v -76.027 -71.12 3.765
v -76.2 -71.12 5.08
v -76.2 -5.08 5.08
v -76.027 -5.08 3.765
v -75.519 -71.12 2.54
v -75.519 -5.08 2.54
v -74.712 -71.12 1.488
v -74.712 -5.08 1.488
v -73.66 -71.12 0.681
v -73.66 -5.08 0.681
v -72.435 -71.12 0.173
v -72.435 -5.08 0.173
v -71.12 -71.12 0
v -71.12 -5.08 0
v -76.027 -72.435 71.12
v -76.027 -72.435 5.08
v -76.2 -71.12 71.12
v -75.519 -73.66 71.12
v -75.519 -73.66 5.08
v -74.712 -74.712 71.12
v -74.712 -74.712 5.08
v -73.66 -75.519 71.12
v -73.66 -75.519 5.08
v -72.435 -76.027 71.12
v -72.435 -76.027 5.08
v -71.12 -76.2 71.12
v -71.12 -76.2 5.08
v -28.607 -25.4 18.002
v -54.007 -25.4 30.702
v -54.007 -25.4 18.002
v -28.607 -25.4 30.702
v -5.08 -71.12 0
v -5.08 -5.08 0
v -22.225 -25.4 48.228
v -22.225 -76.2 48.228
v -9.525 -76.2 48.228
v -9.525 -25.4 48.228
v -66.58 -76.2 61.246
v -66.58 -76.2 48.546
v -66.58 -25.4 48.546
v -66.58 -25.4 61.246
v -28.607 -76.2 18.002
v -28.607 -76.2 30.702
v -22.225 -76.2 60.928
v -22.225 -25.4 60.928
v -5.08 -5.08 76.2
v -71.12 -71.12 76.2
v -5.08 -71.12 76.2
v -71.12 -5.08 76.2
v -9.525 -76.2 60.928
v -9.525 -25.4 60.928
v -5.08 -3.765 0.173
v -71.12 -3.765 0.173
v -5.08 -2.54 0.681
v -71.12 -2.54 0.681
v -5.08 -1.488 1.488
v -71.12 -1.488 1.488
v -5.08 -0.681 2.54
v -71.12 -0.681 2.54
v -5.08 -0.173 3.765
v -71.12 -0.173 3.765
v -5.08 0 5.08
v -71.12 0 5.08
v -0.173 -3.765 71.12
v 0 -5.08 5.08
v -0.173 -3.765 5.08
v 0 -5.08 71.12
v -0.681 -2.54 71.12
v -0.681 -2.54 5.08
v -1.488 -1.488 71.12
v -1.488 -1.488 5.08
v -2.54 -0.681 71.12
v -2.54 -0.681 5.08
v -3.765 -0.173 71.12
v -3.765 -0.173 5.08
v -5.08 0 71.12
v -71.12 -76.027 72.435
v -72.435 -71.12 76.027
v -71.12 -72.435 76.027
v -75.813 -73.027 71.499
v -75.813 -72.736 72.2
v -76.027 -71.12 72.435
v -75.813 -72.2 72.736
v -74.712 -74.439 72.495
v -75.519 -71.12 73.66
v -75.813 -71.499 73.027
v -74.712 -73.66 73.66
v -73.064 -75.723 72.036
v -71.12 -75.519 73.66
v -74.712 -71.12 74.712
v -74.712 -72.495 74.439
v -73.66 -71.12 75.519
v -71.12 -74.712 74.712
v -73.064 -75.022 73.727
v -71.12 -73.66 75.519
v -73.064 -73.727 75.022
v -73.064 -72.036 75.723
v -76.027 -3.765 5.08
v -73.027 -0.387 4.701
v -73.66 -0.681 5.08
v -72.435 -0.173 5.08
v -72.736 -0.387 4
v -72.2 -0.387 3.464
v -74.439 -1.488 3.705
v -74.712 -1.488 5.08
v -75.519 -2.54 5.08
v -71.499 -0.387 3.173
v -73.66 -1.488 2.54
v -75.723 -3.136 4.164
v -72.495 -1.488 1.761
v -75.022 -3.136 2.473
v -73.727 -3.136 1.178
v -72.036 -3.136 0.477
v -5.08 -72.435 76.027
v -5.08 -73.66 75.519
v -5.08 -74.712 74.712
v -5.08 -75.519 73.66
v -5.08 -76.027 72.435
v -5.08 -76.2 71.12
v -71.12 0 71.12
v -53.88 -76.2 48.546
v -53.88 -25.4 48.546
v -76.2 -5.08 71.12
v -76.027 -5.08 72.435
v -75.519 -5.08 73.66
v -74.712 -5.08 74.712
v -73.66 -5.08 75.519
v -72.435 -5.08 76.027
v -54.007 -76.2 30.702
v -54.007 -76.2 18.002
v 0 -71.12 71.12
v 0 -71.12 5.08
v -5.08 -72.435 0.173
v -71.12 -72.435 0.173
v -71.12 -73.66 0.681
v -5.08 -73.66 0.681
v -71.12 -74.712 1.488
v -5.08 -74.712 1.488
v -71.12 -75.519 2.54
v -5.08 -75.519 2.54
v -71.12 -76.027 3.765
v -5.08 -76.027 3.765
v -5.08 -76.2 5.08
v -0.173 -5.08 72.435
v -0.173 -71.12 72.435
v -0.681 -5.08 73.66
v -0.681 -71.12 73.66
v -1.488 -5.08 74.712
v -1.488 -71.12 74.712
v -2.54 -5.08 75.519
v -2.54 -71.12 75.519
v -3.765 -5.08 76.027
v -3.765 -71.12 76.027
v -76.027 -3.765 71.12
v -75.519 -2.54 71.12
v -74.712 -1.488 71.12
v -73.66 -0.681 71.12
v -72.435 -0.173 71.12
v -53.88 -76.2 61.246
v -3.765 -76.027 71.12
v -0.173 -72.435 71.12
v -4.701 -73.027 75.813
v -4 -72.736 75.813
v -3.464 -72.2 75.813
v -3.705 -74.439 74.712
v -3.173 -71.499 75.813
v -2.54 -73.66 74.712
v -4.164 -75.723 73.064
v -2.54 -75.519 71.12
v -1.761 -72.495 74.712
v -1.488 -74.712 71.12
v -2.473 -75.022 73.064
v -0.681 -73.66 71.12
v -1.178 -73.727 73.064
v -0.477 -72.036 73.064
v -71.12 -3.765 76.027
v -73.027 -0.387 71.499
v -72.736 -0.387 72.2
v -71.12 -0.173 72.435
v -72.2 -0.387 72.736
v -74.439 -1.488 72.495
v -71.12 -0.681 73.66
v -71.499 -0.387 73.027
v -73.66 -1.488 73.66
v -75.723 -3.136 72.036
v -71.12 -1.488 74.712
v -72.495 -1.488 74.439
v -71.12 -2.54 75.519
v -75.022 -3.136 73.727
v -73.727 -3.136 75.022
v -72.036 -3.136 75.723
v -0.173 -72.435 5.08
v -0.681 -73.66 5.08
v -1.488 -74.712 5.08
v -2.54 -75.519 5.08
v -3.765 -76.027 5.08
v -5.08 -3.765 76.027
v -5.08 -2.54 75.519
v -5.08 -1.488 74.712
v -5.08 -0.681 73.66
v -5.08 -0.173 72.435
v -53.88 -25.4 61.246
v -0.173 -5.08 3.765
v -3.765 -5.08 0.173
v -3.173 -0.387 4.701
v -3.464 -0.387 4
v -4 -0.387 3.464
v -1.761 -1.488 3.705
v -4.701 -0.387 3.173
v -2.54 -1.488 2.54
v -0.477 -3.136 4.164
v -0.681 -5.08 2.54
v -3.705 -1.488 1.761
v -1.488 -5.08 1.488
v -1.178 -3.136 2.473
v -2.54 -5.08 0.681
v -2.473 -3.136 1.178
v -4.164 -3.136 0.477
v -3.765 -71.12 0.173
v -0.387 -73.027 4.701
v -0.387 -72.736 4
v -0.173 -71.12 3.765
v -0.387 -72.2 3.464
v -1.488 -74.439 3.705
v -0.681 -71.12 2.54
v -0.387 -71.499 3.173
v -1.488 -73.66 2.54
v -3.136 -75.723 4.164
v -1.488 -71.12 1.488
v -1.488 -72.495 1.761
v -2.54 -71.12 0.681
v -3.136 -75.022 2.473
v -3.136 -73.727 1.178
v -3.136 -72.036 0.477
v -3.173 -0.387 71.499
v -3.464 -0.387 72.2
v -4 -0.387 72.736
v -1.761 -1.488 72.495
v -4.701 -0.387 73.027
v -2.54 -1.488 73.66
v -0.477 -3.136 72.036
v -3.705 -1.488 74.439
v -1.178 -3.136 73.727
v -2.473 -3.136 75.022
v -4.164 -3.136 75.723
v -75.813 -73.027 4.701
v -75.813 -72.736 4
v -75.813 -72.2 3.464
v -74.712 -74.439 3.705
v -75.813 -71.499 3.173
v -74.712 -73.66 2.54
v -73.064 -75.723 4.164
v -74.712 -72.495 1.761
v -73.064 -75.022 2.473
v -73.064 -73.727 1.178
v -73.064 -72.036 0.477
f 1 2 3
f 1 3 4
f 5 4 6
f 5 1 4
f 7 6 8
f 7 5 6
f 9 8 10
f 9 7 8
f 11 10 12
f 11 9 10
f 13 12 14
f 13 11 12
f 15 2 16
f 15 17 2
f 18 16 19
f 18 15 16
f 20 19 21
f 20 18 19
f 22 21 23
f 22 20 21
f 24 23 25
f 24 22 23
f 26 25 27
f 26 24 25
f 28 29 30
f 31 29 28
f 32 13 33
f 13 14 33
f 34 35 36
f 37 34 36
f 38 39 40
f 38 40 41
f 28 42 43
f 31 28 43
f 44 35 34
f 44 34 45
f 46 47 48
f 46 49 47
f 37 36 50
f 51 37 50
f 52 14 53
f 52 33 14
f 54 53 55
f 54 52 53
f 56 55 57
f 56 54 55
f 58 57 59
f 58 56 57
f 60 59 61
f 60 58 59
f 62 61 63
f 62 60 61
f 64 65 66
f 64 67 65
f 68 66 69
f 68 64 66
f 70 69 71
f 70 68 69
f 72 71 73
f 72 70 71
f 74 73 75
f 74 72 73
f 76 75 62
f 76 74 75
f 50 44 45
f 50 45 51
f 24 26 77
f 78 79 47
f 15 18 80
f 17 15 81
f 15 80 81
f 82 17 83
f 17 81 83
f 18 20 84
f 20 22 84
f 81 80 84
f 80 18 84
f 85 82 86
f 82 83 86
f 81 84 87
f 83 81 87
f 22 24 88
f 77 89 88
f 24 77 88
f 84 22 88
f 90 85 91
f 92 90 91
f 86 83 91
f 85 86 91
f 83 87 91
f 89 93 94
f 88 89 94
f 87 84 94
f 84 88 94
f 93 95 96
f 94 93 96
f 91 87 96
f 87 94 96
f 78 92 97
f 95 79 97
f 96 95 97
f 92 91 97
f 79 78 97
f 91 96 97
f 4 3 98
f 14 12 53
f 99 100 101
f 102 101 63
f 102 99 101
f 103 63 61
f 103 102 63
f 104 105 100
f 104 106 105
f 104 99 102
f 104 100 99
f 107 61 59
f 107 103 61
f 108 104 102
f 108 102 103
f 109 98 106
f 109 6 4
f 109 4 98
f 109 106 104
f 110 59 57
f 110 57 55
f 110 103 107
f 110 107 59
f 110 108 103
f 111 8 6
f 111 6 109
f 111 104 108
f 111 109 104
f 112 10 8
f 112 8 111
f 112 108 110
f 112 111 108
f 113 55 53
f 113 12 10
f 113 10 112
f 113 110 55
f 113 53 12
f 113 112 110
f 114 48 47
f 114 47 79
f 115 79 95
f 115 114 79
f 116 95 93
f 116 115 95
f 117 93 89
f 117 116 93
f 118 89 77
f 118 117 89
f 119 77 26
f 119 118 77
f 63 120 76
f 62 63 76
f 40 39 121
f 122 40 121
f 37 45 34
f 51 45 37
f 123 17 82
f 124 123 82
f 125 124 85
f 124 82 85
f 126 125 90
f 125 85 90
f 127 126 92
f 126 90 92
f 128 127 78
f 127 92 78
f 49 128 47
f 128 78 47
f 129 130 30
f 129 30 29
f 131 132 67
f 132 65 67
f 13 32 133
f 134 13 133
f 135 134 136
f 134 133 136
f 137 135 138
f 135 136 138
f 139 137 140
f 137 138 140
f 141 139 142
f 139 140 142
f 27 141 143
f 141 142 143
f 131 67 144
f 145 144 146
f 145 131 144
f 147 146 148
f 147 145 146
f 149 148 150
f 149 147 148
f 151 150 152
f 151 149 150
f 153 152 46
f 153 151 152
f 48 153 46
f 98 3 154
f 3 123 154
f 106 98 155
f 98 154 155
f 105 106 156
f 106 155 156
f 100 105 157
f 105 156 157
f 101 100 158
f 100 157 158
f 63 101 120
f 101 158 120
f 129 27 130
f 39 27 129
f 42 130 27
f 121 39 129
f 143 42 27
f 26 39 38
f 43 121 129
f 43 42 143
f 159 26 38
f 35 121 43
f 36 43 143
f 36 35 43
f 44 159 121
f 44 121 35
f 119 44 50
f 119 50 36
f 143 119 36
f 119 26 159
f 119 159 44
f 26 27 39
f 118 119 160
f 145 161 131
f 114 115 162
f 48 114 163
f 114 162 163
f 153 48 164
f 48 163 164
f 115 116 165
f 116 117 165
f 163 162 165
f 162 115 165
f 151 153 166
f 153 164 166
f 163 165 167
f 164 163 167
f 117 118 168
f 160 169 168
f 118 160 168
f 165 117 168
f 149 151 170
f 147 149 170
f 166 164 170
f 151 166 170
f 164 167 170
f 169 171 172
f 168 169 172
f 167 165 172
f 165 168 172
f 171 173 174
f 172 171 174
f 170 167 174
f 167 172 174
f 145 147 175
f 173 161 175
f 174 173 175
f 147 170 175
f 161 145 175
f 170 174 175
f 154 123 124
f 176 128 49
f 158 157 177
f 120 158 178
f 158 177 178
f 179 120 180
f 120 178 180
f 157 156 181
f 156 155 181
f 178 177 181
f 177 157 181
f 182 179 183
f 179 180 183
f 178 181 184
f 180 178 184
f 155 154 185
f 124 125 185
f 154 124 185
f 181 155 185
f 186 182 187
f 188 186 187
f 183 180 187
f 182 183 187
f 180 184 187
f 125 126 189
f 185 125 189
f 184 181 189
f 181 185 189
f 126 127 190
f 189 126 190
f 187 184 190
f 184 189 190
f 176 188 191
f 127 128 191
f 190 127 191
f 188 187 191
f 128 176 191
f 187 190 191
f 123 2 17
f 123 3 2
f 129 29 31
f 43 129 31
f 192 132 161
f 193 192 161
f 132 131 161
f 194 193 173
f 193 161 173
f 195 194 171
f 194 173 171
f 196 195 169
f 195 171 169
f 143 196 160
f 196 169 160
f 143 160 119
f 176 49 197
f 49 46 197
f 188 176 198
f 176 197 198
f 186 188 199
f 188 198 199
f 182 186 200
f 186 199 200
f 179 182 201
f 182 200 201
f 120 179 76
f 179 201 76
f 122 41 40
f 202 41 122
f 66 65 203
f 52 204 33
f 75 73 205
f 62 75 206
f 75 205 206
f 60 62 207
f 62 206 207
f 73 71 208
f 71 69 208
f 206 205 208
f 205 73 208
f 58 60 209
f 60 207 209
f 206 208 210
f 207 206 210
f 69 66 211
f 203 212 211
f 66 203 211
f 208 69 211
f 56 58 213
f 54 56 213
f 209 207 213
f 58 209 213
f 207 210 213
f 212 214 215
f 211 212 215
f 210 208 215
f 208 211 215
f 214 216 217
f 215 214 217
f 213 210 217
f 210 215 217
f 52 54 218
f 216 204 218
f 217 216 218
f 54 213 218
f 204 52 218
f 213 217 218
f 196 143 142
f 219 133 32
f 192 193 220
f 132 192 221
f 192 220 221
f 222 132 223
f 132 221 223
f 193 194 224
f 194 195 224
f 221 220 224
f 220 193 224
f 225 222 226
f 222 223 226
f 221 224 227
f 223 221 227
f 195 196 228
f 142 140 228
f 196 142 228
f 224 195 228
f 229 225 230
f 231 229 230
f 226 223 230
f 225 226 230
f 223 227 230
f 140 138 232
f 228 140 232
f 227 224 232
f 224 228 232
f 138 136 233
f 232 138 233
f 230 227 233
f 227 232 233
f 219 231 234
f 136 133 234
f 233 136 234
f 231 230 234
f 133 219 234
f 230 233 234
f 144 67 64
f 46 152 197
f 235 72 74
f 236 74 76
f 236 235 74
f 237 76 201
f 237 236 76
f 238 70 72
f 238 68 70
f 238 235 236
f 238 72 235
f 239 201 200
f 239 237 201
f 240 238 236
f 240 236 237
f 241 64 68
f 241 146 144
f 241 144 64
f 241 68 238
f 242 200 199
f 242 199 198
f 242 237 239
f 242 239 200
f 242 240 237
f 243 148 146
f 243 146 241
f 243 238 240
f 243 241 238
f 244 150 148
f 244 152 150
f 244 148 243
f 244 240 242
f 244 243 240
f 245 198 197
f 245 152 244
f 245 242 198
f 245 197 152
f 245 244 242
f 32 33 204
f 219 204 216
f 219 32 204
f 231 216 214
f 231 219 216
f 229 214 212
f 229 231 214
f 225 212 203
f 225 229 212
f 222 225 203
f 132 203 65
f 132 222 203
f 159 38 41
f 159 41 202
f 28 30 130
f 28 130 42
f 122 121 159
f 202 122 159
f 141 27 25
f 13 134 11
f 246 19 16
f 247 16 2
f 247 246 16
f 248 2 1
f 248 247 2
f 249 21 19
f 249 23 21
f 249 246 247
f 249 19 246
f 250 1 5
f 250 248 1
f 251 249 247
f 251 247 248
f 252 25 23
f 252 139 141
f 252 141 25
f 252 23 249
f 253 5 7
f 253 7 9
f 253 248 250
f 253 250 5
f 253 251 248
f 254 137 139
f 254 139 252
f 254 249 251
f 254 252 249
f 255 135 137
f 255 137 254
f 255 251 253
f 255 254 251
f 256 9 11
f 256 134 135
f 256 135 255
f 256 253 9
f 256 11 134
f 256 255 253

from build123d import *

# Parameters (mm, degrees)
F0_W     = 76.2
F0_H     = 76.2
F1_DEPTH = 76.2
F3_R     = 5.08
F2_W     = 12.7
F2_H     = 12.7
F2_W_2   = 25.4
F4_DEPTH = 50.8


with BuildPart() as f1:
    # F0 (on Front) → F1 (new body)
    with BuildSketch(Plane.XZ):
        with Locations((-38.1, 38.1)):
            Rectangle(F0_W, F0_H)
    extrude(amount=F1_DEPTH)

    # F3
    f3_edges = [f1.edges().sort_by_distance(p)[0] for p in [
        (-38.1, -76.2, 0),
        (0, -76.2, 38.1),
        (-38.1, -76.2, 76.2),
        (-76.2, -76.2, 38.1),
        (0, -38.1, 0),
        (0, -38.1, 76.2),
        (0, 0, 38.1),
        (-76.2, -38.1, 76.2),
        (-76.2, -38.1, 0),
        (-76.2, 0, 38.1),
        (-38.1, 0, 0),
        (-38.1, 0, 76.2),
    ]]
    fillet(f3_edges, radius=F3_R)

    # F2 (on face) → F4 (cut)
    with BuildSketch(Plane.XZ.offset(76.2)):
        with Locations((-60.229752, 54.895747)):
            Rectangle(F2_W, F2_H)
        with Locations((-15.875, 54.578253)):
            Rectangle(F2_W, F2_H)
        with Locations((-41.306752, 24.352249)):
            Rectangle(F2_W_2, F2_H)
    extrude(amount=-F4_DEPTH, mode=Mode.SUBTRACT)


solid = f1.part
